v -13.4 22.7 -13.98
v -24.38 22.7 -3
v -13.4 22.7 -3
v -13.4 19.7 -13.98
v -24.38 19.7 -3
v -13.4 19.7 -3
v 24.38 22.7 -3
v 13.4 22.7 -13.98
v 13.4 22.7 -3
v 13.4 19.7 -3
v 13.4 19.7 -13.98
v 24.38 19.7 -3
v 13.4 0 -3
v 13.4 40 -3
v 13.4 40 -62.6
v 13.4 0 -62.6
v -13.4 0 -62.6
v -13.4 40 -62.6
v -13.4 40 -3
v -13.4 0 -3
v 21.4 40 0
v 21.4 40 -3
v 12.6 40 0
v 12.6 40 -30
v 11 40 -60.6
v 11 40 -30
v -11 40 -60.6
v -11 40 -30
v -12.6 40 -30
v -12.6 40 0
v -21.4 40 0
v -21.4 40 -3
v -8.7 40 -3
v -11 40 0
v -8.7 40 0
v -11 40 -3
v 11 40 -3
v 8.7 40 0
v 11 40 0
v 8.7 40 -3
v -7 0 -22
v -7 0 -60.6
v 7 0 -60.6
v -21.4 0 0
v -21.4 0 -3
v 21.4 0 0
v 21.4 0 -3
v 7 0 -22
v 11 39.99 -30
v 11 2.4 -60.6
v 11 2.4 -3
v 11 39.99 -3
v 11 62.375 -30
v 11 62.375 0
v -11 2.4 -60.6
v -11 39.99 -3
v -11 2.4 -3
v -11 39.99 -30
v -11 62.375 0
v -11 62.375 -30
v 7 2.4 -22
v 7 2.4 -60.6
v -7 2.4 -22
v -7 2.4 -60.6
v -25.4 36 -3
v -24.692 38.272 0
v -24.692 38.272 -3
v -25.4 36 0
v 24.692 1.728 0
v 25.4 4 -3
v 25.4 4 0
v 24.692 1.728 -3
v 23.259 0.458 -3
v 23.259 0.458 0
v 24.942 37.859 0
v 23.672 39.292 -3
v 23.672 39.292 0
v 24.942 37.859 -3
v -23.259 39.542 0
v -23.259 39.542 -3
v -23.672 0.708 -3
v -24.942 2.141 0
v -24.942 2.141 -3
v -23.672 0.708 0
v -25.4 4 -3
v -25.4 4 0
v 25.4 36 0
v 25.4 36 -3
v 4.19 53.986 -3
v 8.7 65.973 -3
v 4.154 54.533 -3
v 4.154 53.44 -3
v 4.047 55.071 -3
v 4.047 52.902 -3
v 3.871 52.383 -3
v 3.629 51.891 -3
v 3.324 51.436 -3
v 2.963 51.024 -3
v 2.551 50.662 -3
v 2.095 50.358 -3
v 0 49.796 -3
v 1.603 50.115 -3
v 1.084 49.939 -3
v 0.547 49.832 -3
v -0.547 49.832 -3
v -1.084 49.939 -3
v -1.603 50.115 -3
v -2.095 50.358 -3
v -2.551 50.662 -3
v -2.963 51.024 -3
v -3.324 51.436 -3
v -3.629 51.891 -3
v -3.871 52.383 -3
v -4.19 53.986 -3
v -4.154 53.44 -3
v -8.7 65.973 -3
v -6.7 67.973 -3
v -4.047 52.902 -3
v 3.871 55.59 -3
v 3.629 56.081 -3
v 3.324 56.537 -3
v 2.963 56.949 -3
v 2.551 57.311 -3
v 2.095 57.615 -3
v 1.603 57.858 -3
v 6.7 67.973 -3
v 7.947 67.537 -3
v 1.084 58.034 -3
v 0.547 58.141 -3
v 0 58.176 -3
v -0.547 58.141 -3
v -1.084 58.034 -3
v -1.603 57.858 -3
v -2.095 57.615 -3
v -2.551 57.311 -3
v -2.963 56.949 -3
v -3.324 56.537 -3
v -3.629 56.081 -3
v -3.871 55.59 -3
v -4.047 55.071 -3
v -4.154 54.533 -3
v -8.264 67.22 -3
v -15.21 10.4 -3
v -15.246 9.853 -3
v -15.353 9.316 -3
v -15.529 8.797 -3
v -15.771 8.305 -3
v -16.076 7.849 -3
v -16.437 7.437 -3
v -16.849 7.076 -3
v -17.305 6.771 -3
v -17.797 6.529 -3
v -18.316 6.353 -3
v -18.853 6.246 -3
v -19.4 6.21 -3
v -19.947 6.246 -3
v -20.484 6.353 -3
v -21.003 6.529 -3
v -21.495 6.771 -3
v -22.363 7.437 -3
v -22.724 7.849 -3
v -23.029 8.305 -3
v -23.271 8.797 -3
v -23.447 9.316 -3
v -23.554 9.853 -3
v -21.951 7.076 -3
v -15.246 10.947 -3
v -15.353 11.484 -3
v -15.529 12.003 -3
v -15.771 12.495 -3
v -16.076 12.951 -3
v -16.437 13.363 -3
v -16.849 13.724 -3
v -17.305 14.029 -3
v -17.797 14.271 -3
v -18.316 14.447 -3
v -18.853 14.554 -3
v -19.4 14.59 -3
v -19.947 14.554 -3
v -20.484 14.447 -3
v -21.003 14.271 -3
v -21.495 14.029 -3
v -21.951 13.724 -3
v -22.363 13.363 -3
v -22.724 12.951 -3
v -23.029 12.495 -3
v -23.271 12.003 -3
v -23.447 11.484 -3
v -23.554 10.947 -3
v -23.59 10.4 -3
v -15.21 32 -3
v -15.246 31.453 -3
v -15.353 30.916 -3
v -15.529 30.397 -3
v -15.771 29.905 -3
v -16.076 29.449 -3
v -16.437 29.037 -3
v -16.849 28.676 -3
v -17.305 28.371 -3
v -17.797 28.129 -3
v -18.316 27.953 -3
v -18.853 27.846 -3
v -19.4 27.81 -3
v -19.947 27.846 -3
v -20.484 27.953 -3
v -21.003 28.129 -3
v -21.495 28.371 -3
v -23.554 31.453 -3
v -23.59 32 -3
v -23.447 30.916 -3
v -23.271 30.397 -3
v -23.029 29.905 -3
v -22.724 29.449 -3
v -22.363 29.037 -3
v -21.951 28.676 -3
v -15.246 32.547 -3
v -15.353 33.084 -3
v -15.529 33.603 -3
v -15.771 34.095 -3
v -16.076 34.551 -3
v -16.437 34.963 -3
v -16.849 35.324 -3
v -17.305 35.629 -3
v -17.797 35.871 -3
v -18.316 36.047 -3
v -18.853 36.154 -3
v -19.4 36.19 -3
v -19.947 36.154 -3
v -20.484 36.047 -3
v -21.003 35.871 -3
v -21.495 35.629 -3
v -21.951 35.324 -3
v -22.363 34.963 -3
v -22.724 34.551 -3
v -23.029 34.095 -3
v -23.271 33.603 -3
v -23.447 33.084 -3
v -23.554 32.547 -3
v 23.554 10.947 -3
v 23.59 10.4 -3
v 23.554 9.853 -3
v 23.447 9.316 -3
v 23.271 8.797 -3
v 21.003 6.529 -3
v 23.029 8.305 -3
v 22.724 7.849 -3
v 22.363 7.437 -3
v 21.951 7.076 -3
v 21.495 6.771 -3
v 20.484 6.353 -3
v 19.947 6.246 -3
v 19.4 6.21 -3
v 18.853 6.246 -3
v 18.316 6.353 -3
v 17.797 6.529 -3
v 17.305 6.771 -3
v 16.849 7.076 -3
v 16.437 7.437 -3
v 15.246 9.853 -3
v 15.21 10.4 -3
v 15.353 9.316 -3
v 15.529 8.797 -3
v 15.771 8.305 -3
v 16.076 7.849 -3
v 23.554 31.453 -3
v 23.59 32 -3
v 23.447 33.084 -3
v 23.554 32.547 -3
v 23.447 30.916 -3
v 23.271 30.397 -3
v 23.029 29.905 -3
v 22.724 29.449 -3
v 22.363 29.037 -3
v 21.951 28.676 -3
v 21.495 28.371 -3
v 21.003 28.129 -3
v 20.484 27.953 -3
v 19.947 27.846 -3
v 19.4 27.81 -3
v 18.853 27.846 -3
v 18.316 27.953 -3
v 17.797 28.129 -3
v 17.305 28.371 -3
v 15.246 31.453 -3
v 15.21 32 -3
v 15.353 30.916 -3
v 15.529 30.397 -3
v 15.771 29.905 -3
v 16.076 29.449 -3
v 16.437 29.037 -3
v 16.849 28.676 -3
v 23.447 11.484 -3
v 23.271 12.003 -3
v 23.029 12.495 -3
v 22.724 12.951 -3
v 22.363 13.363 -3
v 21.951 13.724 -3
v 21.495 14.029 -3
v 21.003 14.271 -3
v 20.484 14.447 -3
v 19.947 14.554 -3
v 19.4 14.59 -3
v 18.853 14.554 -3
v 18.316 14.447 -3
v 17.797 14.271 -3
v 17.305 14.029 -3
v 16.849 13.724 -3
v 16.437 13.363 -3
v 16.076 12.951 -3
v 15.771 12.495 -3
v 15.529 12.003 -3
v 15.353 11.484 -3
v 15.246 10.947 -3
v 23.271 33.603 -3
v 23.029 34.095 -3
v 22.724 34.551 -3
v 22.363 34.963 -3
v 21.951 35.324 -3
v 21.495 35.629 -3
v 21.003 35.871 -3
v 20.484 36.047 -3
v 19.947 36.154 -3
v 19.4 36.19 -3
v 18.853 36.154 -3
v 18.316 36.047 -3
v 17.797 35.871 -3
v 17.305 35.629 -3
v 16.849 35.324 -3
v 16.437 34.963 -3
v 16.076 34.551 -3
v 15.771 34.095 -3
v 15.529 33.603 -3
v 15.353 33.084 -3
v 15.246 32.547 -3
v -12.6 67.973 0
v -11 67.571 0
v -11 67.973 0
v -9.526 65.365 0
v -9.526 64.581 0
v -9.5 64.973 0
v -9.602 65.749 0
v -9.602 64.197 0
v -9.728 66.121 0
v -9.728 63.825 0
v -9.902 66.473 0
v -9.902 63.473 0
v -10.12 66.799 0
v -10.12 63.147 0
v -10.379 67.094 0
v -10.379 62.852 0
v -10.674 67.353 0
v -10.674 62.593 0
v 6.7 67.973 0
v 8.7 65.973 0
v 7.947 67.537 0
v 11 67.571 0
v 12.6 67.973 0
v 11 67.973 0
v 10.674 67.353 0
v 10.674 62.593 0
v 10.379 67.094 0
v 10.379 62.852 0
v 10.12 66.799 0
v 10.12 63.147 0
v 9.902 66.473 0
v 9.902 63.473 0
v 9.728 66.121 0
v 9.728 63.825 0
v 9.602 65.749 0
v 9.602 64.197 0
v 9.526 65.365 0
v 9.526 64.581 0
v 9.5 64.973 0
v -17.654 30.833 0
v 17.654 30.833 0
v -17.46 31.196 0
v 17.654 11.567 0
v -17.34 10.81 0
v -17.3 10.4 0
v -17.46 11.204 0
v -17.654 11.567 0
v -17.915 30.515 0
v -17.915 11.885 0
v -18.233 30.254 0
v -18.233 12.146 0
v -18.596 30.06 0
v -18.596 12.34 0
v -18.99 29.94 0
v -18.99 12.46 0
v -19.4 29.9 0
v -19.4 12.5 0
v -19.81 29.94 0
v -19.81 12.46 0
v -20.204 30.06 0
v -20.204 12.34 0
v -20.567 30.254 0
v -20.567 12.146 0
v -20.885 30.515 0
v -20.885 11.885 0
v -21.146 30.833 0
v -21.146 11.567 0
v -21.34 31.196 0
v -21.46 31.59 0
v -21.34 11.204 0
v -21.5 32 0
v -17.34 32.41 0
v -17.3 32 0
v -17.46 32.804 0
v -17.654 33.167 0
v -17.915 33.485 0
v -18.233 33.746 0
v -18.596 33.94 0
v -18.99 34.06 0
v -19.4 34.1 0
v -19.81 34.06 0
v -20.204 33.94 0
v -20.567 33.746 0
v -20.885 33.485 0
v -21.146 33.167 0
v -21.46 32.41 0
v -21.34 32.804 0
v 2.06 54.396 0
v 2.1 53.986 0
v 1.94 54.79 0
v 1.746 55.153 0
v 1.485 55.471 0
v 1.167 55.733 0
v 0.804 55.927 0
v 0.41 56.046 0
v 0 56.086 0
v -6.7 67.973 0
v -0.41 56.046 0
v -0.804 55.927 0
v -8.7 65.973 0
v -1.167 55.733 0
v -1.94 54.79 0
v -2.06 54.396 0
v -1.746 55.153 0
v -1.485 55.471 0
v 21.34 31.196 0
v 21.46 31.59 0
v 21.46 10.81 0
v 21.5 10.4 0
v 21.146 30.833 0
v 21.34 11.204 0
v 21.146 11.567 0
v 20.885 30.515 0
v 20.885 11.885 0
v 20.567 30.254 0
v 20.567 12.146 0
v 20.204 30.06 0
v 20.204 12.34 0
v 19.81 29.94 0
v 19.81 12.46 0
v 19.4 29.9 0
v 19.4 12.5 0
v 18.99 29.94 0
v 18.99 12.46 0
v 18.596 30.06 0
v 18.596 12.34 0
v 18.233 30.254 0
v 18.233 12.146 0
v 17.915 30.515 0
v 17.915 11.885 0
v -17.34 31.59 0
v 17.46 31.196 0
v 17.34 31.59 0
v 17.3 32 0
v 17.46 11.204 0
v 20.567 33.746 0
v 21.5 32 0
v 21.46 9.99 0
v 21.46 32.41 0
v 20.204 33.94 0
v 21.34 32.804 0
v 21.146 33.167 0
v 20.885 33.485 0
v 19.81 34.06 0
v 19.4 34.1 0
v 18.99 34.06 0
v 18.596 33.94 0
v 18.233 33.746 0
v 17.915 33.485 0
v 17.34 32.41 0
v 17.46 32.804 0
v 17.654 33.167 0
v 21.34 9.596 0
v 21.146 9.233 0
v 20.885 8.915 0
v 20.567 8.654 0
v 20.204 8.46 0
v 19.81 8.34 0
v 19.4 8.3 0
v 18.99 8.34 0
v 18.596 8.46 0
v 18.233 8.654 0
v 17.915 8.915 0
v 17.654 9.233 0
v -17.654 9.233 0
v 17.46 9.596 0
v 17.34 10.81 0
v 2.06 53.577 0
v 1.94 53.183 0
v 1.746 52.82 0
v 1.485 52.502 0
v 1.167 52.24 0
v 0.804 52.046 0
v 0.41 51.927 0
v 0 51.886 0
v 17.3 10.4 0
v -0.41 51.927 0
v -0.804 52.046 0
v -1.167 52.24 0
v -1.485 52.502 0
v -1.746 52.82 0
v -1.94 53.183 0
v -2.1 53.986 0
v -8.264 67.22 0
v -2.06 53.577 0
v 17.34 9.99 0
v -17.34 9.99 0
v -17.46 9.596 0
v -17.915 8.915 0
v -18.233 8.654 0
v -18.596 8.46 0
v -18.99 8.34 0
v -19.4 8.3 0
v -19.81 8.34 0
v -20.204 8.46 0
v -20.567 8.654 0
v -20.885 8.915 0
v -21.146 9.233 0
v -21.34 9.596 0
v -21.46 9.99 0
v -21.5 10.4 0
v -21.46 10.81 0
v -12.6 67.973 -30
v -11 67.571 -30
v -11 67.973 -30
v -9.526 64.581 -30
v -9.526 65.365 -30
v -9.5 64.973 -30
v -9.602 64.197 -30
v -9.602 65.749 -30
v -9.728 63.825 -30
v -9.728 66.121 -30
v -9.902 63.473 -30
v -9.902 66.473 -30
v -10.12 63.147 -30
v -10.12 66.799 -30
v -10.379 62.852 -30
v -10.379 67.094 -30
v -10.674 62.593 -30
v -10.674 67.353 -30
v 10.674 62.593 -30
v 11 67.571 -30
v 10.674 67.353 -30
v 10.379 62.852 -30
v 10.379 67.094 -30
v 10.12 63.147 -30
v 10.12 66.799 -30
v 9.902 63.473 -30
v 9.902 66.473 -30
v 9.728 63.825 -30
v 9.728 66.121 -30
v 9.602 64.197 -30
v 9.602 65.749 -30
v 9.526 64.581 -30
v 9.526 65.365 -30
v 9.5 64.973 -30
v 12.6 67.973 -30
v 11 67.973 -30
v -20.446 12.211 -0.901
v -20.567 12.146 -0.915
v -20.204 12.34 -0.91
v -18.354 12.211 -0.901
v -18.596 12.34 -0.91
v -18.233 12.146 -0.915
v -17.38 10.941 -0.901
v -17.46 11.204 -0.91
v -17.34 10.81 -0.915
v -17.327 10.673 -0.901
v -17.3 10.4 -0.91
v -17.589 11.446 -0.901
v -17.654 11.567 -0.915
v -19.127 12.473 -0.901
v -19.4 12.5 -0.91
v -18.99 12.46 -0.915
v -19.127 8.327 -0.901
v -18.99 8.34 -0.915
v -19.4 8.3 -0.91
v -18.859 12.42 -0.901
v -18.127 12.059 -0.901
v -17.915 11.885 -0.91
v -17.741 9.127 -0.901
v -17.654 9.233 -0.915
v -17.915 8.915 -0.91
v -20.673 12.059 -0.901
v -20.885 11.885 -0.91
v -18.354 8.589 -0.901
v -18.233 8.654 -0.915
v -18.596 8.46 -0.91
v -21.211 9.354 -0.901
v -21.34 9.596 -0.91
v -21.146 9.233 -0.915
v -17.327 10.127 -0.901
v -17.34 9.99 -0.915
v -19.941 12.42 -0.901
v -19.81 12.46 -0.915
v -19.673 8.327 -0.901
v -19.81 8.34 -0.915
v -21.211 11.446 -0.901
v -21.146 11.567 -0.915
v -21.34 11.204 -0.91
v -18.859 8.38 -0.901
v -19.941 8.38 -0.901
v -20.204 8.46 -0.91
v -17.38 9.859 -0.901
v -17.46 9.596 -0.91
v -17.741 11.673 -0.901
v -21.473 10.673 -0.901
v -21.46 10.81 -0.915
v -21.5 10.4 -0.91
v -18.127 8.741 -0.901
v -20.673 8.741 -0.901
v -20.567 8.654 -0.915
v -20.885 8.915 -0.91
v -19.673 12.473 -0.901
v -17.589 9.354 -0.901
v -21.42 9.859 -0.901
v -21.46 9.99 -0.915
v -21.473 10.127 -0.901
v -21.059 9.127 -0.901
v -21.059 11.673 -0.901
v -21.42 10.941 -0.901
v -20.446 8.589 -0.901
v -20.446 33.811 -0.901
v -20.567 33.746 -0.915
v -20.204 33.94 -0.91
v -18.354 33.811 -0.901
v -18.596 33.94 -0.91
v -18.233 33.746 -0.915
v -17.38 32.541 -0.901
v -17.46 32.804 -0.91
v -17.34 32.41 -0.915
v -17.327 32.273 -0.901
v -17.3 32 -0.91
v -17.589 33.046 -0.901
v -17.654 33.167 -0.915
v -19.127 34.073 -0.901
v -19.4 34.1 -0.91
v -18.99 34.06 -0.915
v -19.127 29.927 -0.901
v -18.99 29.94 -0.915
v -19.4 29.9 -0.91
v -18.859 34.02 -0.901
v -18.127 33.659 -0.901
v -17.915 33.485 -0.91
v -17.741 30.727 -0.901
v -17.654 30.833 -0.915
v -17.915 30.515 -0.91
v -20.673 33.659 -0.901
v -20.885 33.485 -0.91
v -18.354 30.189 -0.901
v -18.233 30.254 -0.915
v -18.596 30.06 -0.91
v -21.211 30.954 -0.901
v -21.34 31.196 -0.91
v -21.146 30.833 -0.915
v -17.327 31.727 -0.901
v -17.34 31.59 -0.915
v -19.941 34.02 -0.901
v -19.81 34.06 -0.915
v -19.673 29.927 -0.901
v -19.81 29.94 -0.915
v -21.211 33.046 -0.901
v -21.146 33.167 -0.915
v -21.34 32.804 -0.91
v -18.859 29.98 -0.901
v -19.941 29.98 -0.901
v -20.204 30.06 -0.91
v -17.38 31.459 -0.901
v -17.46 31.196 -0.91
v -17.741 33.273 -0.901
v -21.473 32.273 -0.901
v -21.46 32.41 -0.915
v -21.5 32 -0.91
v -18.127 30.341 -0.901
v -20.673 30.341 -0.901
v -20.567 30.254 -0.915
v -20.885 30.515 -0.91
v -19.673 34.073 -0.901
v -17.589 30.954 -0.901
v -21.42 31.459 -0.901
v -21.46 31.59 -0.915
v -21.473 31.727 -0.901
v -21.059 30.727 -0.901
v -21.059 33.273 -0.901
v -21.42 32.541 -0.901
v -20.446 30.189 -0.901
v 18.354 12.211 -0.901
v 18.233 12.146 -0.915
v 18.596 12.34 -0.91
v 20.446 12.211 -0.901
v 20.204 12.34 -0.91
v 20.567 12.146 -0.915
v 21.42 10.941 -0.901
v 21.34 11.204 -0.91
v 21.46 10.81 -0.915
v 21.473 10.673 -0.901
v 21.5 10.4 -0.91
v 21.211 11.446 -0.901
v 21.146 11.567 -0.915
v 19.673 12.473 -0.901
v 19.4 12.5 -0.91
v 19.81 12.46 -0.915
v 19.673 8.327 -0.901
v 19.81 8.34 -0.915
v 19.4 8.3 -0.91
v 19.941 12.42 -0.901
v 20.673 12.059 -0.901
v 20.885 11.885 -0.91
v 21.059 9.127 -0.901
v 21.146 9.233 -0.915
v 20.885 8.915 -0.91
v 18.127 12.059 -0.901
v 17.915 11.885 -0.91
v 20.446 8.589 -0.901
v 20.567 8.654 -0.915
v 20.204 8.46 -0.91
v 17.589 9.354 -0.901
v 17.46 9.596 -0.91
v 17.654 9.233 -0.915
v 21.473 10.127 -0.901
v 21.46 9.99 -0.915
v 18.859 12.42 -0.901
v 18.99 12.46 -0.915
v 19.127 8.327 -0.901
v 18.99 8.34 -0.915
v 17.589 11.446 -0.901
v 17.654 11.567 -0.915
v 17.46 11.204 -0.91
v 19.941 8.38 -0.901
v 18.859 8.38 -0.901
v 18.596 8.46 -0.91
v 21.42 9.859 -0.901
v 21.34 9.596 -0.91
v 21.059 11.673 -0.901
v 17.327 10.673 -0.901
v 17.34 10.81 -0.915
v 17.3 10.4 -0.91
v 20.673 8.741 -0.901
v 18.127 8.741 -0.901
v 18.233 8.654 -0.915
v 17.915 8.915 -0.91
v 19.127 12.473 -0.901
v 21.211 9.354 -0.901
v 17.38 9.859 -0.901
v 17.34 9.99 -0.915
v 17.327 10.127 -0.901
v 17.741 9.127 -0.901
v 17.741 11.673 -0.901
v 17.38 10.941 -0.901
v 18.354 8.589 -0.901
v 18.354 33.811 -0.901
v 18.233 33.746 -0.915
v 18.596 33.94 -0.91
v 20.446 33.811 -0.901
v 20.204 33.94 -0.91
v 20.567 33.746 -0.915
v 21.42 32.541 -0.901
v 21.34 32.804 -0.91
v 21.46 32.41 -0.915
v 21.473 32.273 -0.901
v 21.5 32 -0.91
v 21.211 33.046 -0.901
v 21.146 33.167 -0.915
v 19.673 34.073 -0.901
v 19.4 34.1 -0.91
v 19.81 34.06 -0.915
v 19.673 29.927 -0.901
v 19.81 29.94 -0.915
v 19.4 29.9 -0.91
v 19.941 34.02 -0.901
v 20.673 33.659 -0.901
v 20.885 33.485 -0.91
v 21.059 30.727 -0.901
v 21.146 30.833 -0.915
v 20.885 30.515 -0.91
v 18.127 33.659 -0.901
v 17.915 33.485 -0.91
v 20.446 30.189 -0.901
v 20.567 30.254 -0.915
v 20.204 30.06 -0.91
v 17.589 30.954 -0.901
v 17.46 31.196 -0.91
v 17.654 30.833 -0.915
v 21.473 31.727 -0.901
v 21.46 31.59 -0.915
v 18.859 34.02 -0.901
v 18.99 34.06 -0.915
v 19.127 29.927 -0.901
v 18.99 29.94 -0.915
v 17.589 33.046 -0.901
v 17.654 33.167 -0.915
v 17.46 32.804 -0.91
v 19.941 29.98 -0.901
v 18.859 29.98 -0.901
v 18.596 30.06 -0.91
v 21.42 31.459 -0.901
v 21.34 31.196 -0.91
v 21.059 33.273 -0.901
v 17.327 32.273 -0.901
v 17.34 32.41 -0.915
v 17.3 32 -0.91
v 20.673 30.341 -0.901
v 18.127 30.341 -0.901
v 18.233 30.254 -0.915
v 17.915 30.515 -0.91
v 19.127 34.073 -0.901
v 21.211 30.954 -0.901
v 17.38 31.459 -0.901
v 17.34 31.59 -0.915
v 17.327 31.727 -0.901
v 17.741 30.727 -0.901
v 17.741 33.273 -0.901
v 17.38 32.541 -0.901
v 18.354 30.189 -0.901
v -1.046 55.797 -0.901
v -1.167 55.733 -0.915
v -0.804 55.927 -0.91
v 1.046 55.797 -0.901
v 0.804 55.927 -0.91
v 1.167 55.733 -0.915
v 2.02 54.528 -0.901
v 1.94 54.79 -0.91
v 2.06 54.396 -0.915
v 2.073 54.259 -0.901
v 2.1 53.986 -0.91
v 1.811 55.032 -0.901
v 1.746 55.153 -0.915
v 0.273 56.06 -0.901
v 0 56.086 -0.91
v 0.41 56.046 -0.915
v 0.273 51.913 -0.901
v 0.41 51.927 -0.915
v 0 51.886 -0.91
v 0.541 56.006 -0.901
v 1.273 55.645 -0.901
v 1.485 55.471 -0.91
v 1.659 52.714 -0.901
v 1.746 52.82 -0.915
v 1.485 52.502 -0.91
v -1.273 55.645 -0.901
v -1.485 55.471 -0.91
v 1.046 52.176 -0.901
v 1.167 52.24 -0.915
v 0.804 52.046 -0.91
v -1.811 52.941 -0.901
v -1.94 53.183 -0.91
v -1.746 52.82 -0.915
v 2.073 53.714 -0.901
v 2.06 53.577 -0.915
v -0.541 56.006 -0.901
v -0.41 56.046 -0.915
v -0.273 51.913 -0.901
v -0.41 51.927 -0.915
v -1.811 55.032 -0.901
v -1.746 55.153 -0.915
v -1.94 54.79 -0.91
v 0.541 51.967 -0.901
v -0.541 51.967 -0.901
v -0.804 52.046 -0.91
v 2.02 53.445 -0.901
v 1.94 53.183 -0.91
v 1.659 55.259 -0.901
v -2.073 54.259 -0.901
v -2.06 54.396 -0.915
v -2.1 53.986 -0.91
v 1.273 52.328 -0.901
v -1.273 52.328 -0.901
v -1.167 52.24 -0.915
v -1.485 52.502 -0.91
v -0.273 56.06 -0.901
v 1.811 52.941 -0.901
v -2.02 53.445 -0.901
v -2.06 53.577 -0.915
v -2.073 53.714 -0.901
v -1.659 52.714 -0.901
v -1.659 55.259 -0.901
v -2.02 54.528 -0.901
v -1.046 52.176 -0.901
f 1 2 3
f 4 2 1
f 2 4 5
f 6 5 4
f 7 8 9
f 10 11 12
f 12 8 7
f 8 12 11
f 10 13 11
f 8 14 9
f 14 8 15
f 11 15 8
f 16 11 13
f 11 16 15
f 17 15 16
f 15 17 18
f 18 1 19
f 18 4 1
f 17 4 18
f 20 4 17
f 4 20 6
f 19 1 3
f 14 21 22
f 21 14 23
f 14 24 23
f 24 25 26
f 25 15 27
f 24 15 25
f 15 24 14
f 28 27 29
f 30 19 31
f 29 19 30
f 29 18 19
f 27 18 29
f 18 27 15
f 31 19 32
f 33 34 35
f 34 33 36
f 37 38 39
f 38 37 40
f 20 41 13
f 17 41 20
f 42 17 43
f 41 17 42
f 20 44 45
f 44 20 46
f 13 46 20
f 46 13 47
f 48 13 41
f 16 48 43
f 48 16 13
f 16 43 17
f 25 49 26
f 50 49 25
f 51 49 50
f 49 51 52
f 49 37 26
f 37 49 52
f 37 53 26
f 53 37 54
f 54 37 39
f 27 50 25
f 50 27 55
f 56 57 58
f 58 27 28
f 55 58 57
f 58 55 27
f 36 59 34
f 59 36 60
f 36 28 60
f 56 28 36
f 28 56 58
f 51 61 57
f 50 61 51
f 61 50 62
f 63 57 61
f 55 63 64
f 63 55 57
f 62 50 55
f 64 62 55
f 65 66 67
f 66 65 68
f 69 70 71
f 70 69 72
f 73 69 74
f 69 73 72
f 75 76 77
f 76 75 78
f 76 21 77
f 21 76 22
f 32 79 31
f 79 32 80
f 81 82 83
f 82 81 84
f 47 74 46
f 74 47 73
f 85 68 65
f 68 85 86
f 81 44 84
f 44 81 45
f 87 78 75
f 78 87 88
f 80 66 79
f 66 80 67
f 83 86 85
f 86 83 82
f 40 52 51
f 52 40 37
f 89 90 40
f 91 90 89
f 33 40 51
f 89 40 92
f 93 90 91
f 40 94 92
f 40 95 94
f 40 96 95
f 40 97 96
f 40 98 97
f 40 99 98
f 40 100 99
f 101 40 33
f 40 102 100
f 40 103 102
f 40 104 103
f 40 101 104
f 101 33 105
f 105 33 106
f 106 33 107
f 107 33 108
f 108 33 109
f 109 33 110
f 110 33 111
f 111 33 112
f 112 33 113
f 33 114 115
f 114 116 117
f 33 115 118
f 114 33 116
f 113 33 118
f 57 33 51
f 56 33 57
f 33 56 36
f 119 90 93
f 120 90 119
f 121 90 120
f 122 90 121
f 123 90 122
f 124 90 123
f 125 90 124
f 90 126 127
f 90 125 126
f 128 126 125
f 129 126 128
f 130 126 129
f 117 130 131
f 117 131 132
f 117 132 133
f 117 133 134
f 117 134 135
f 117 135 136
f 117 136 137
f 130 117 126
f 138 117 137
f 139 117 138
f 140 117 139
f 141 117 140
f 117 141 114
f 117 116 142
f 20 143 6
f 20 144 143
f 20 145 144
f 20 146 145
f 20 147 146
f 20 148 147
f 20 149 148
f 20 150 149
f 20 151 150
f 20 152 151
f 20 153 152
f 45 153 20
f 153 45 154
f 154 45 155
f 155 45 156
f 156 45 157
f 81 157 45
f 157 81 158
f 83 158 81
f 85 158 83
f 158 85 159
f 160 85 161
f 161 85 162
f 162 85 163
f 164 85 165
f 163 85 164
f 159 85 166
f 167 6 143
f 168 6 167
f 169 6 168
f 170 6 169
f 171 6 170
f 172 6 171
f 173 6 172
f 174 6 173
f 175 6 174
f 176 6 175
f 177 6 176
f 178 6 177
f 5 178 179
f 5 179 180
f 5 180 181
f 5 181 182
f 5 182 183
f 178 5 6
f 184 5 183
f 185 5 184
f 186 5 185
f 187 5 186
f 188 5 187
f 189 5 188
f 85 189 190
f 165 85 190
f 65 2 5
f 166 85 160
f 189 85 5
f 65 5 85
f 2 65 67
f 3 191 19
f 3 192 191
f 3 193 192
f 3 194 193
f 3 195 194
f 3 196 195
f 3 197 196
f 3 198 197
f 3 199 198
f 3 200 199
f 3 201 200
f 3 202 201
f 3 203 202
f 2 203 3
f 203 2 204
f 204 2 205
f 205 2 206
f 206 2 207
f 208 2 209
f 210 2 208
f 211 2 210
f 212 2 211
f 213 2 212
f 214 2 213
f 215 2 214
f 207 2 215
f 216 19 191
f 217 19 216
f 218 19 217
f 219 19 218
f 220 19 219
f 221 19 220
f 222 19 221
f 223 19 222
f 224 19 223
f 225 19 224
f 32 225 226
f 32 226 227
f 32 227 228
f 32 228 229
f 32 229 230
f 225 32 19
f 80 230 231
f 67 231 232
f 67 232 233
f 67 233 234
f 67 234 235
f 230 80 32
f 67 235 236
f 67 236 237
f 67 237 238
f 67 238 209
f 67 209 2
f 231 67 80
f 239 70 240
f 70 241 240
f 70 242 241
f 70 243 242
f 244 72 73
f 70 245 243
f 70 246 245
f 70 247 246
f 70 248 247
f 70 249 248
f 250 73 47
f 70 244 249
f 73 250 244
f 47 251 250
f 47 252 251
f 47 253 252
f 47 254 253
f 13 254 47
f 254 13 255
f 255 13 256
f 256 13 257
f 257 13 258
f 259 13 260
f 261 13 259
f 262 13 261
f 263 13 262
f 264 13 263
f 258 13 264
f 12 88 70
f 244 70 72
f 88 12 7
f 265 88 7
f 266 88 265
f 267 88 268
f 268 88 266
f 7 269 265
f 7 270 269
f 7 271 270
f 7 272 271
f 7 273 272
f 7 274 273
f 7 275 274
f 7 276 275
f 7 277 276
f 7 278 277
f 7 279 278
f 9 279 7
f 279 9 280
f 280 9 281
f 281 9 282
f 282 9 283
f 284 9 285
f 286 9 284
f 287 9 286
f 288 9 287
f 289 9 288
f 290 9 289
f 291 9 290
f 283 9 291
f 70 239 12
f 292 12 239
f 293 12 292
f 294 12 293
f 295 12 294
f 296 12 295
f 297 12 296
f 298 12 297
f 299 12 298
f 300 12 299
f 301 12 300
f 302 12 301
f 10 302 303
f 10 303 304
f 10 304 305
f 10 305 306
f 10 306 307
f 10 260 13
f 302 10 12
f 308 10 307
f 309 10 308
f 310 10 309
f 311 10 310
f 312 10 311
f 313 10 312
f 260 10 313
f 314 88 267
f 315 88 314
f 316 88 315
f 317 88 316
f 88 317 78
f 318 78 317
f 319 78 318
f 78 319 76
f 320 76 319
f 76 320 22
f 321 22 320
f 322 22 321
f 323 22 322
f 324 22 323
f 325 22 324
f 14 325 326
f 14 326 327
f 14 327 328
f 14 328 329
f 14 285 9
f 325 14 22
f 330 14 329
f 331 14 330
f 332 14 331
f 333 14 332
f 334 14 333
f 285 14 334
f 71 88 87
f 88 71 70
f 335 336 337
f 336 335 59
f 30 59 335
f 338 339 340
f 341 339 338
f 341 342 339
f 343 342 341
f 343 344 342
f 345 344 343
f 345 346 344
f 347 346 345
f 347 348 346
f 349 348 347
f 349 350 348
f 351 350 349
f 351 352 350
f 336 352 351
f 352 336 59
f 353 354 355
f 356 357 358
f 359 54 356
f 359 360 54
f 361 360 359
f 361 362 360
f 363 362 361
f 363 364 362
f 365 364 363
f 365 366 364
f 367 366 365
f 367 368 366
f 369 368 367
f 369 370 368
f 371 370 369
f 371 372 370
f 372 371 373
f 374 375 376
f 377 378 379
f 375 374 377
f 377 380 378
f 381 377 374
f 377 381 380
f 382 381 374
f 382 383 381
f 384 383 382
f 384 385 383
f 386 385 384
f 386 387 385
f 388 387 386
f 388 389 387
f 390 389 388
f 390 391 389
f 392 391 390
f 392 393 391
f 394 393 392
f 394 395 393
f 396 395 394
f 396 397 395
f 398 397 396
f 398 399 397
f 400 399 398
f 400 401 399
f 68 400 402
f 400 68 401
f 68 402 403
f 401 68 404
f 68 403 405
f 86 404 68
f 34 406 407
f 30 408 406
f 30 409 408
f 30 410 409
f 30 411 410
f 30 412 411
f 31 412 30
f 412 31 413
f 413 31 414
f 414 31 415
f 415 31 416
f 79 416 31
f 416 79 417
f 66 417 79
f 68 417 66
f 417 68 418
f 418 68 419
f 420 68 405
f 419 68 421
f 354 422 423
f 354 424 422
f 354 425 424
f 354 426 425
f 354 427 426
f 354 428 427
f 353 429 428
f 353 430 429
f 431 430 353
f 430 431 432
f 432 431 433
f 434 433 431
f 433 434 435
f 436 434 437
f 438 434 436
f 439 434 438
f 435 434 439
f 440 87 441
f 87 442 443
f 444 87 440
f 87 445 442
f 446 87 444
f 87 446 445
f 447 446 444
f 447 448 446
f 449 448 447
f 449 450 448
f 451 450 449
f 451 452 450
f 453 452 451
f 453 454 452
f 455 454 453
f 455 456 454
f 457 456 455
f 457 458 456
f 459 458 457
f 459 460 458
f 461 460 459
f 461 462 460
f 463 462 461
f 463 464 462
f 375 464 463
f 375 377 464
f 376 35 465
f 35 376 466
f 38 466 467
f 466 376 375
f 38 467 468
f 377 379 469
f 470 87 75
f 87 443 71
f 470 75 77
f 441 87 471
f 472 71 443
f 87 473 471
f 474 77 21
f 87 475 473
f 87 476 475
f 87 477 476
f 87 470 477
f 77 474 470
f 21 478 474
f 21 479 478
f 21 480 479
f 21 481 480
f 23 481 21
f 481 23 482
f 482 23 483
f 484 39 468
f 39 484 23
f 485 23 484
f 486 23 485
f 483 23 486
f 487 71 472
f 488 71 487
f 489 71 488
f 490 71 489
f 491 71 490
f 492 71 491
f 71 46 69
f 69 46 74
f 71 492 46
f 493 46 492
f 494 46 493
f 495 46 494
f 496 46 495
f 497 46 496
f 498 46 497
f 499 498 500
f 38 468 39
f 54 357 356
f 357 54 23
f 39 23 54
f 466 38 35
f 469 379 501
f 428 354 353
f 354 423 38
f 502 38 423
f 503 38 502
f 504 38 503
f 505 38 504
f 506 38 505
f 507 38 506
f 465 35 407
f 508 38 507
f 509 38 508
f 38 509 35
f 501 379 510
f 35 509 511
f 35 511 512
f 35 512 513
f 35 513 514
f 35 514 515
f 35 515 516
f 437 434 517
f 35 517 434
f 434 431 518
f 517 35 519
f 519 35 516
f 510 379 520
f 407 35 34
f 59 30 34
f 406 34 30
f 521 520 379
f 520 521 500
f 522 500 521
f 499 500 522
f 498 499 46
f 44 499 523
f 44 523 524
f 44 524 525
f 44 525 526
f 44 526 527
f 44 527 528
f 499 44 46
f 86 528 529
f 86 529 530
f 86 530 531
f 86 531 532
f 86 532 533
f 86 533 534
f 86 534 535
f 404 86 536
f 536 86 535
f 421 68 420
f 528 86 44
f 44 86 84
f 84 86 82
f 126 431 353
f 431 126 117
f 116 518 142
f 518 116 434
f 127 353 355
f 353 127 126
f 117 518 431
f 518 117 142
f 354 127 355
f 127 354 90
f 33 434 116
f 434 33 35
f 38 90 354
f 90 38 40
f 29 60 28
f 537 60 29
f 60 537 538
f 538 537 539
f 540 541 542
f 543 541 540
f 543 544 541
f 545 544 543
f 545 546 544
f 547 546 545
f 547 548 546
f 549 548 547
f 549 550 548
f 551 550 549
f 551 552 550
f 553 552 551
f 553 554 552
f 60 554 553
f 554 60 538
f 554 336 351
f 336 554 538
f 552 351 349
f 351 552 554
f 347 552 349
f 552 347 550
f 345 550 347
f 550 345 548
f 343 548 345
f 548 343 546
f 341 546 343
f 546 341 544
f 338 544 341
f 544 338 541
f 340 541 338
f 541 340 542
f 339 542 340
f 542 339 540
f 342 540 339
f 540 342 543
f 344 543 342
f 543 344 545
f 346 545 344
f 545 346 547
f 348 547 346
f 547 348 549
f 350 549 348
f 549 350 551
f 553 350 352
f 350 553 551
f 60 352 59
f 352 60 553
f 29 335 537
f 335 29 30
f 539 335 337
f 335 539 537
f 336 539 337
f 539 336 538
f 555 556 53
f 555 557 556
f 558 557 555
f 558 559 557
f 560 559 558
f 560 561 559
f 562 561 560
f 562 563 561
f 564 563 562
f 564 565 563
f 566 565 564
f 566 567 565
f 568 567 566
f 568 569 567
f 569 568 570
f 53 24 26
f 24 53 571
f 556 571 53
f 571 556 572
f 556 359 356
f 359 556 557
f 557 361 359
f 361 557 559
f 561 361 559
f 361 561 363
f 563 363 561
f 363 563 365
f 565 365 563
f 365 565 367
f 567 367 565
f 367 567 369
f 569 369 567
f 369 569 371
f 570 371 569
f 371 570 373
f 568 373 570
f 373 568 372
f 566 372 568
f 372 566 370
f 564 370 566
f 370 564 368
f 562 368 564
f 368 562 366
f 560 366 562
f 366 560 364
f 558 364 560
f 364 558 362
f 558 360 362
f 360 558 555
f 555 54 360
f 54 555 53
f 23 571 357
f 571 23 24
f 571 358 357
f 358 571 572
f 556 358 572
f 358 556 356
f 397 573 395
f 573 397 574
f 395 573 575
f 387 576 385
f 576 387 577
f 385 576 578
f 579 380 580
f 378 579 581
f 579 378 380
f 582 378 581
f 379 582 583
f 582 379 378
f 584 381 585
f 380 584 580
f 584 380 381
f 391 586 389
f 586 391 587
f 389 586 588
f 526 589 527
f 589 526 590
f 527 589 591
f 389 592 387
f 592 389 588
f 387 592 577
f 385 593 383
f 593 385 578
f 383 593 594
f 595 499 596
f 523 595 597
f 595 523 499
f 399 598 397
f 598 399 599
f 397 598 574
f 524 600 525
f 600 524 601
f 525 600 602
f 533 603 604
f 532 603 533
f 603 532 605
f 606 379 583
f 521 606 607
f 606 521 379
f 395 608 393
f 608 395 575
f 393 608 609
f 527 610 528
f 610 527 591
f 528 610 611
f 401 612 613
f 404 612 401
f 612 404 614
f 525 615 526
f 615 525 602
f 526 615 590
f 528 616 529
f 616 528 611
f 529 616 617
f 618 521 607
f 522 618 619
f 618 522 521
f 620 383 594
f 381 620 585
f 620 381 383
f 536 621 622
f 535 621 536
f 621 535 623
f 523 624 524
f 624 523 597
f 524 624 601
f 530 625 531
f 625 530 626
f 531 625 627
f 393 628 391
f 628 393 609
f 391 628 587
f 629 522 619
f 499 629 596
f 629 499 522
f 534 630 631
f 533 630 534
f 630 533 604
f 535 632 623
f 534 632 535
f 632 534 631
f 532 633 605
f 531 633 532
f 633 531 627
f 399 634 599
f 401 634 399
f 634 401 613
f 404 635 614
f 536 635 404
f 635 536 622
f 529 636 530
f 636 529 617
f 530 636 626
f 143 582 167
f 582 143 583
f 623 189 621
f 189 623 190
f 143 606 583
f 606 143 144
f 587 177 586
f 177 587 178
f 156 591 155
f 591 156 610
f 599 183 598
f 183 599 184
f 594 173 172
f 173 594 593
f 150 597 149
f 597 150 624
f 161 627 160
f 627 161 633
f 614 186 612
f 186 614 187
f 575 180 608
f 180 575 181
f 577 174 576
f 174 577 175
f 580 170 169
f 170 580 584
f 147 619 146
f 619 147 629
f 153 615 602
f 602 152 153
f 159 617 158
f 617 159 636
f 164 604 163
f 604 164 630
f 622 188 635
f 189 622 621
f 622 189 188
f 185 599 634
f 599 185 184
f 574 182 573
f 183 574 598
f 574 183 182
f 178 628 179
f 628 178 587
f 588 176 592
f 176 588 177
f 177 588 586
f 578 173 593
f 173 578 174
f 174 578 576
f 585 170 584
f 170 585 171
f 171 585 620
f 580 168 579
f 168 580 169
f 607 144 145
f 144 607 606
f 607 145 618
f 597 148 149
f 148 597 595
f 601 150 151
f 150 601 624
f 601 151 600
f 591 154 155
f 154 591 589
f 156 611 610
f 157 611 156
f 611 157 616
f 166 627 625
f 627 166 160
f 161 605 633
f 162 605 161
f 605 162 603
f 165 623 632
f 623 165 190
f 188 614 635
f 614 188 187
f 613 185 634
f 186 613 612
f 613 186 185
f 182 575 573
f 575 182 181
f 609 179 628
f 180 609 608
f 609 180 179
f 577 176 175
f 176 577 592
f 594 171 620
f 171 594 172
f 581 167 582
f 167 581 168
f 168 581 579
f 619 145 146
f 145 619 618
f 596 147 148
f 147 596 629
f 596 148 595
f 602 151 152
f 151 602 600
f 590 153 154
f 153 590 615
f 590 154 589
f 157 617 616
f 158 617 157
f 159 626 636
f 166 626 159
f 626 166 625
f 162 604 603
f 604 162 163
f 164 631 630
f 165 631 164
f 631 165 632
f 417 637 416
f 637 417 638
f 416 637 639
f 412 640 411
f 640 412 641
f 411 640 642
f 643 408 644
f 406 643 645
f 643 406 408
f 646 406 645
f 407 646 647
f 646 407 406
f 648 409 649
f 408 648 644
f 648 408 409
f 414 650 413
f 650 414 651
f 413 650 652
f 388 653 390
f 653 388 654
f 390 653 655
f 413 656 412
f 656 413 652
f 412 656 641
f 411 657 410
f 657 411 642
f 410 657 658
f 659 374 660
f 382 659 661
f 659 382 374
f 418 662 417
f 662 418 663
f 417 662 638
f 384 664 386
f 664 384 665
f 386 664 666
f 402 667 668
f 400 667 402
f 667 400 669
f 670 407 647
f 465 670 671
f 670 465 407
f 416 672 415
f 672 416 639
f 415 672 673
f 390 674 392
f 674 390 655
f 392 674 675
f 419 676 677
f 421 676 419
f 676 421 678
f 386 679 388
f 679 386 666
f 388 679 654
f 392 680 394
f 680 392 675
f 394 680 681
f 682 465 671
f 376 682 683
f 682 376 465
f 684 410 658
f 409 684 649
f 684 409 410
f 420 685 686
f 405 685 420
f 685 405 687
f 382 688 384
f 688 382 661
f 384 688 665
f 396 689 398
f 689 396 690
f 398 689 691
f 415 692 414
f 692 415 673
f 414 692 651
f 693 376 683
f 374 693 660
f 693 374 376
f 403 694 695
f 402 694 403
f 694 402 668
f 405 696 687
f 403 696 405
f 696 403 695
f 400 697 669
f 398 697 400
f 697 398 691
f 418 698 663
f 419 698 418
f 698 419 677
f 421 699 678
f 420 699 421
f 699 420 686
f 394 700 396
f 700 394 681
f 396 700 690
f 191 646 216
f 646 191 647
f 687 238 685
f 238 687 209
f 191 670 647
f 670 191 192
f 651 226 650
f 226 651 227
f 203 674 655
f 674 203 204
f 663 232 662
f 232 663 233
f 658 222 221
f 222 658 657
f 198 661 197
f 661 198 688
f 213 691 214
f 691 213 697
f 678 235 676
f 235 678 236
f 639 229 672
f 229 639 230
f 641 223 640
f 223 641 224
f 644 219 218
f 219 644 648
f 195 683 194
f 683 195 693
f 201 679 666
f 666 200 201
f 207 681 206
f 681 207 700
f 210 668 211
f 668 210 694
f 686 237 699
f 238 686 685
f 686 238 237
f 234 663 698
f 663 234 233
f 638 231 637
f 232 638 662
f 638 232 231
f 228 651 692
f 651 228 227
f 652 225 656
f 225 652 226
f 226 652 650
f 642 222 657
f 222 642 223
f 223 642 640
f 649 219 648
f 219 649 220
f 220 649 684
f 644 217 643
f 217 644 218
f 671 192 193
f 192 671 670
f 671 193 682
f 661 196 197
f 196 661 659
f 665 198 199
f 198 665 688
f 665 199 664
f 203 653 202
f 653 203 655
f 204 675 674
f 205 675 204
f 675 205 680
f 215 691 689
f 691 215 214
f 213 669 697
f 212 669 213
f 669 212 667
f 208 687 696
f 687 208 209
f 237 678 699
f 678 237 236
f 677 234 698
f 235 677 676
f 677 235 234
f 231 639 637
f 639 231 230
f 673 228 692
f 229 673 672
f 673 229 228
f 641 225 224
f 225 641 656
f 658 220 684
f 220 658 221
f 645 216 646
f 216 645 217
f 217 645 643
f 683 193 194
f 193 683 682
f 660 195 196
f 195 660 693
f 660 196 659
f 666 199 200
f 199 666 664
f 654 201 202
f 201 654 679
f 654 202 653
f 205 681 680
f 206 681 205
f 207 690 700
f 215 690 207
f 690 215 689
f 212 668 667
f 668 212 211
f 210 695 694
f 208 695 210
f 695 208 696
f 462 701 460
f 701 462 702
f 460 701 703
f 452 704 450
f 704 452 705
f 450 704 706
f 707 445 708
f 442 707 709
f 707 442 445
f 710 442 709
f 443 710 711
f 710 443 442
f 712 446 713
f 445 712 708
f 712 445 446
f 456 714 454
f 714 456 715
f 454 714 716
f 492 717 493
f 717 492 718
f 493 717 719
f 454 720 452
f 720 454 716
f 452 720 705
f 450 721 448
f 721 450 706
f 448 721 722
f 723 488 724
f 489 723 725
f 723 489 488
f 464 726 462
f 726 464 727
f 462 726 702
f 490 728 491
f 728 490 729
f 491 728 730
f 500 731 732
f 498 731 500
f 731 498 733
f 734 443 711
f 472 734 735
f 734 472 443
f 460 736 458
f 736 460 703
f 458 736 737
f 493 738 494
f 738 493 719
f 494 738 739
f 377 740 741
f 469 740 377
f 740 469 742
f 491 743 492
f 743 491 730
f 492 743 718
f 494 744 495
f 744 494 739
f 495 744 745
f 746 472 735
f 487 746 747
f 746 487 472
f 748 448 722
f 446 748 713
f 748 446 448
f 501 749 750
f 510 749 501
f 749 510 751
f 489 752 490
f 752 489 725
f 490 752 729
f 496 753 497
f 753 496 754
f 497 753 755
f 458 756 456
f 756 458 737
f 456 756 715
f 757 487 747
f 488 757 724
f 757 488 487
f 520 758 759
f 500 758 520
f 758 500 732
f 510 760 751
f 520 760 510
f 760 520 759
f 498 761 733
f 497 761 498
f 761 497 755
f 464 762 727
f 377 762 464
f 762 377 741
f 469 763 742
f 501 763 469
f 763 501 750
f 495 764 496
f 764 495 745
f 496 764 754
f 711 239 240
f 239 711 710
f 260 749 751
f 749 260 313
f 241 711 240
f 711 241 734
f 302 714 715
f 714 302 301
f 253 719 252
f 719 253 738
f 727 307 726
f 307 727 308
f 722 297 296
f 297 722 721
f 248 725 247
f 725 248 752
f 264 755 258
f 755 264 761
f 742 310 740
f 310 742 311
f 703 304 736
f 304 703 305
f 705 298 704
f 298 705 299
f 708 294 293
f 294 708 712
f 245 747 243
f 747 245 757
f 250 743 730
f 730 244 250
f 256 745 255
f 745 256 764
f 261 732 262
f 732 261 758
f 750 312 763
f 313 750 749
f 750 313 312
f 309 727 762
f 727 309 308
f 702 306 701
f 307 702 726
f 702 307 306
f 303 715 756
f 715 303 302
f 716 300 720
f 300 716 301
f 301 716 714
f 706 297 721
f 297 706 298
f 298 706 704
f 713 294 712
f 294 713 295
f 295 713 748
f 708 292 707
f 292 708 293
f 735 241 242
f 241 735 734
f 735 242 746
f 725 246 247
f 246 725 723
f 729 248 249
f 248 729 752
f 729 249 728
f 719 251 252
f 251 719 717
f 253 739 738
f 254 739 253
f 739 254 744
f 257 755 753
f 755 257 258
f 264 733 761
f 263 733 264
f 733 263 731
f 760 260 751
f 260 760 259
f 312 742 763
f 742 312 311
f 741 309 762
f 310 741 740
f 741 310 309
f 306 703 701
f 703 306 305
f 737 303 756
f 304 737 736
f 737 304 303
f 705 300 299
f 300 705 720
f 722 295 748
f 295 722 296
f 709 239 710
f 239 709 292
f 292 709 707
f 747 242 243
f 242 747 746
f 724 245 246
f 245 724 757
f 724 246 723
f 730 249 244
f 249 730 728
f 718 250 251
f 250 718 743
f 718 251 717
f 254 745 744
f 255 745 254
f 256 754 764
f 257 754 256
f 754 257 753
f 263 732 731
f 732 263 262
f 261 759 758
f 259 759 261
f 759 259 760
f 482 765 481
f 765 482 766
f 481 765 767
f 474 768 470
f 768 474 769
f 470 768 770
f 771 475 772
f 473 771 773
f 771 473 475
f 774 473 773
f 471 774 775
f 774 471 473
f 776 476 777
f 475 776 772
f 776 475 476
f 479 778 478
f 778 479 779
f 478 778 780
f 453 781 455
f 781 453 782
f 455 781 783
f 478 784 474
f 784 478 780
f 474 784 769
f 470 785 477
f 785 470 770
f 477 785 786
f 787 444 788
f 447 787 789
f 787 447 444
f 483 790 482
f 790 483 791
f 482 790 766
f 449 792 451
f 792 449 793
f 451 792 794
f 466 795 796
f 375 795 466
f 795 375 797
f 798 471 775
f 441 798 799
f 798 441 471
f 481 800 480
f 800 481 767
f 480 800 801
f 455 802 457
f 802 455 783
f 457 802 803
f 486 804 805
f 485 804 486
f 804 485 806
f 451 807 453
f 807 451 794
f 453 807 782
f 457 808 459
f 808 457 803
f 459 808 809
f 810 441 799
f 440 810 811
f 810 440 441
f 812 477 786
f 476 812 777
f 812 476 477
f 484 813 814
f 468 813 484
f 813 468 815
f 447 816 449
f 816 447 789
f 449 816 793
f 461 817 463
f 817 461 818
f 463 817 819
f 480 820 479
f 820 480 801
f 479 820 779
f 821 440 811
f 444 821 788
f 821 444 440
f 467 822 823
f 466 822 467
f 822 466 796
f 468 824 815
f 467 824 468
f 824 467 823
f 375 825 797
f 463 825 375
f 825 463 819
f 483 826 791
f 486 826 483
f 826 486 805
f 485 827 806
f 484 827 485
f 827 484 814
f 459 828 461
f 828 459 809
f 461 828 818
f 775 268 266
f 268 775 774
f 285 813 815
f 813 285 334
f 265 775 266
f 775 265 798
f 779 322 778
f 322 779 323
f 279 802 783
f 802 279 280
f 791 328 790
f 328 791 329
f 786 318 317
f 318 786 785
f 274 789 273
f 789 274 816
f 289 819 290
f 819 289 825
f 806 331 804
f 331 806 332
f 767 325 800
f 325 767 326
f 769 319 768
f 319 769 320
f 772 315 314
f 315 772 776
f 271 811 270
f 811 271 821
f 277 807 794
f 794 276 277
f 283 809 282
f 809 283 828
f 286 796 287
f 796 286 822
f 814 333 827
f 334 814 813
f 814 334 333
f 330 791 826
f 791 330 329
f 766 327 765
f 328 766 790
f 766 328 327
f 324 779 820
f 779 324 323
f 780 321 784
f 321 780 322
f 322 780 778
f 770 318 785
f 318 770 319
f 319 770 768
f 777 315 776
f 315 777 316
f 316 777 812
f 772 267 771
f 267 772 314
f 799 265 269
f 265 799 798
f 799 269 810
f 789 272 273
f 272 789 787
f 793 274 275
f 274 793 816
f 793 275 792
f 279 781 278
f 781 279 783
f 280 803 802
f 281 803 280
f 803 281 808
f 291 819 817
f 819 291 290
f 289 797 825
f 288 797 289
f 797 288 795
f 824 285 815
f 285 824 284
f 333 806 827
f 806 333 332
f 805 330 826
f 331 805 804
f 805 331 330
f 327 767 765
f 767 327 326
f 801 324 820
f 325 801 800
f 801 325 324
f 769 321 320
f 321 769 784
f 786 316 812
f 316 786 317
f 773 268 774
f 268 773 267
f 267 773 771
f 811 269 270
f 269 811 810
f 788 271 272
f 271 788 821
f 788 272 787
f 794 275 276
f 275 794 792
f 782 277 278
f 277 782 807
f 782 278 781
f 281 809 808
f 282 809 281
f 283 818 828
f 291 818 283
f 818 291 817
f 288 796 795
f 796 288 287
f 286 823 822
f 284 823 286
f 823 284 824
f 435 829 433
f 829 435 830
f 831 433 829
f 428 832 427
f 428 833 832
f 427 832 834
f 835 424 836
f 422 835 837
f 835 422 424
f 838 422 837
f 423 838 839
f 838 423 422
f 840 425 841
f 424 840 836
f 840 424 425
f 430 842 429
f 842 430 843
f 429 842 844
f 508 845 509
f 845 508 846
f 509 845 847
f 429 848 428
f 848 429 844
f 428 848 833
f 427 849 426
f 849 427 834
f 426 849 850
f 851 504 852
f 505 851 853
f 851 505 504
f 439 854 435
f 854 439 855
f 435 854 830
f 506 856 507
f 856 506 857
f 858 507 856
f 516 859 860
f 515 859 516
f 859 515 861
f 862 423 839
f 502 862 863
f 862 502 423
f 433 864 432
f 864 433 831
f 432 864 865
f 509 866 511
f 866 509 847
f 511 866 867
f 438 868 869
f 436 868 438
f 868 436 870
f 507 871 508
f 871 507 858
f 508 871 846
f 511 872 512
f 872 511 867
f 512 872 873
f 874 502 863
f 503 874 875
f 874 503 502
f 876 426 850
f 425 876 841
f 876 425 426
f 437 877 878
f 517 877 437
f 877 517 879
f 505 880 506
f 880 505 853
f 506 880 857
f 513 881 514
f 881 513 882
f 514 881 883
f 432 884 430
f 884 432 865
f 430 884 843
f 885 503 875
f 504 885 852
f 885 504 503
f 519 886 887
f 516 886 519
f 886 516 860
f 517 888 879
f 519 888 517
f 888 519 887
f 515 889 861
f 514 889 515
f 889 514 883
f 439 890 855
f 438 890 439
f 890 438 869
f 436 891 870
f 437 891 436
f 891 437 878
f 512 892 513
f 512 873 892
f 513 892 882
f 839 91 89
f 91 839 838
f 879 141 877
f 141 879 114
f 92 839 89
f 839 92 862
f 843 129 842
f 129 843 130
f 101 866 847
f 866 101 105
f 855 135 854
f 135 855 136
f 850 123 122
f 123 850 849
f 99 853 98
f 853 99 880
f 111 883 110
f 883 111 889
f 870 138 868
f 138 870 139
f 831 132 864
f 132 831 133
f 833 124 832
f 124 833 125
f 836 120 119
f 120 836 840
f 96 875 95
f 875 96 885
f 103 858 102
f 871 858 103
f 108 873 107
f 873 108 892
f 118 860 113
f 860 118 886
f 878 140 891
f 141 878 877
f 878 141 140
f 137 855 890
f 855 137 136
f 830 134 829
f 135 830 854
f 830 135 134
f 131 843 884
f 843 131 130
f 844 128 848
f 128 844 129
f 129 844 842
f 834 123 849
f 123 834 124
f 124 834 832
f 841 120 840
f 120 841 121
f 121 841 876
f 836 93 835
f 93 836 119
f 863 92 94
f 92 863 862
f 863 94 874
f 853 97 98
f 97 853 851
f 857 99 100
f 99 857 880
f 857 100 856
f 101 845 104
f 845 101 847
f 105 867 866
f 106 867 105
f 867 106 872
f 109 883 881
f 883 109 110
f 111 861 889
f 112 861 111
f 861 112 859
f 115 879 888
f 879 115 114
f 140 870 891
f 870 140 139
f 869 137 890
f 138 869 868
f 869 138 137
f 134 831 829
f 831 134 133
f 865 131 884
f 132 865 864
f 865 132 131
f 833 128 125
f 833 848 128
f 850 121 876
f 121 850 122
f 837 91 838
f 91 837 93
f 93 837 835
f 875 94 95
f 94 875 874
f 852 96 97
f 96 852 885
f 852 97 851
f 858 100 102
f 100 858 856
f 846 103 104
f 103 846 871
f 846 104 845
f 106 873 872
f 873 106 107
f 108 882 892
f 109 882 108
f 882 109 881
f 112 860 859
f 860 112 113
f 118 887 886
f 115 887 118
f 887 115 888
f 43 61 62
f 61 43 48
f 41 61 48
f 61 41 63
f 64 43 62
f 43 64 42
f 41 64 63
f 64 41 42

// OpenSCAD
// file: ../../lib/makeit.scad
// Shared helpers for makeit models. Use with: use <../../lib/makeit.scad>
// Conventions: millimetres; x/y/z of the *installed* part, z up.

// Keep only the part of children() with y in [y0, y1].
module keep_y(y0, y1, big = 2000) {
    intersection() {
        children();
        translate([-big / 2, y0, -big / 2]) cube([big, y1 - y0, big]);
    }
}

// Piece `index` (0-based) of `count` equal cuts along y, for parts longer
// than the print bed. index < 0 keeps the whole part.
module segment_y(length, count, index) {
    if (count <= 1 || index < 0) children();
    else keep_y(length / count * index, length / count * (index + 1)) children();
}

// Short test-fit slice from the y=0 end (0 = off), else the chosen segment.
// The build sets $section_at (0..1 along y) to render a thin cross-section
// for the profile view.
module print_cut(length, test_slice = 0, segments = 1, segment = -1) {
    if (!is_undef($section_at)) keep_y(length * $section_at, length * $section_at + 0.5) children();
    else if (test_slice > 0) keep_y(0, test_slice) children();
    else segment_y(length, segments, segment) children();
}

// ---- Shapes that keep coming back (2D unless noted) ----

// Rounded rectangle from corner (x0, y0) to (x1, y1).
module rrect(x0, y0, x1, y1, r) {
    r_ = min(r, (x1 - x0) / 2 - 0.01, (y1 - y0) / 2 - 0.01);
    translate([x0 + r_, y0 + r_]) offset(r_) square([x1 - x0 - 2 * r_, y1 - y0 - 2 * r_]);
}

// 3D: countersunk screw hole through a plate of thickness t lying on z=0..t,
// head at z=t. Subtract it. Defaults suit a 4 mm (#8) wood screw. Printed
// head-up, the cone opens upward, so it needs no support.
module cs_screw_hole(t, d = 4.2, head_d = 8.4, fn = 32) {
    translate([0, 0, -0.01]) cylinder(d = d, h = t + 0.02, $fn = fn);
    translate([0, 0, t - head_d / 2 + 0.01]) cylinder(d1 = 0, d2 = head_d, h = head_d / 2, $fn = fn * 1.5);
}

// 3D: 45° brace in the corner between a floor (z=0 up) and a wall face at
// x=0 (body at x<0), sticking out along +x, `leg` long, `t` thick along y
// (centred). It prints without support with the floor on the bed.
module gusset45(leg, t) {
    translate([-0.01, t / 2, -0.01]) rotate([90, 0, 0]) linear_extrude(t)
        polygon([[0, 0], [leg, 0], [0, leg]]);
}

// y position for a detent bump of radius rb standing `depth` into a channel
// so it touches a rounded corner (radius rc) of the part it holds.
// wall_x = the channel's inner wall (x), part_x = the part's side face (x),
// corner_y = y where the part's corner rounding starts (its end minus rc).
// Subtract a little preload so the bump pulls the part home.
function detent_y(wall_x, part_x, rc, rb, depth, corner_y) =
    let(xb = wall_x - depth + rb, ax = part_x - rc)
    corner_y + sqrt(pow(rc + rb, 2) - pow(xb - ax, 2));
// main file
// Under-desk holder for the Lenovo earbud case (the one with the braided
// USB-C lanyard). The case stands on edge in a tall, narrow sleeve hanging
// from the desk: a top plate with screw ears, two side walls, a back wall
// (solid for the top 19 mm, open below for the cable) and a floor the case
// stands on. The front is open. The upper part of each side wall carries
// on past the floor as a spring finger with a bump. The bumps click in
// behind the case's rounded front edge, so the case can't creep out, and a
// firm pull pops it free.
//
// Installed frame: x = across the sleeve (centred), y = into the holder
// (y=0 at the back face, the case slides in toward -y), z = up with z=0 at
// the underside of the desk (the part hangs below, z < 0).
//
// Prints upside down: the desk plate goes on the bed. Walls, fingers and
// bumps are straight vertical extrusions, 45° gussets brace the ears, the
// back opening's top is the floor, and the floor is a short wall-to-wall
// bridge. No supports.
use <../../lib/makeit.scad>

/* [Measured] */
case_w = 21.0;       // hand: sketch note "210", case thickness, across the sleeve (x)
case_h = 57.0;       // hand: photo note "570", standing height (z). Lanyard side faces the back.
case_l = 64.0;       // hand: photo note "640", slide direction (y)
case_edge_r = 5;     // PLACEHOLDER: radius of the rounded edges round the case's faces (from the photo)
back_band_h = 19;    // sketch: back wall solid for the top 19 mm, open below

/* [Design] */
clearance = 0.5;     // per side, x and y: the case should drop in, not press in
clearance_z = 0.6;   // total, over the height
plate_t = 3.0;       // desk plate (on the bed when printing)
wall = 2.4;          // side and back walls (6 perimeters at 0.4)
floor_t = 2.0;       // bridged floor
ear = 12;            // screw ear width beyond each side wall
ear_r = 4;           // ear corner radius
gusset_t = 3;        // 45° brace from each ear down its wall (0 = none)
floor_depth = 40;    // floor and walls run 0..floor_depth; fingers carry on past it
back_open_w = 14;    // opening below the band: cable out, or a finger to push the case out
finger_h = 30;       // spring finger height from the desk (includes the plate)
finger_t = 1.6;      // spring finger thickness (x)
detent_depth = 1.5;  // how far each bump stands into the cavity
detent_r = 3;        // bump radius (plan view)
detent_preload = 0.3;// bump sits this far behind the edge: pulls the case to the back
finger_gap = 0.8;    // slot between the fingers and the plate around them
screw_d = 4.2;       // clearance for a 4 mm (#8) wood screw
screw_head_d = 8.4;  // 90° countersink
front_screw = true;  // extra countersunk screw in the ceiling between the fingers

/* [Print] */
test_slice = 0;      // >0: only the back N mm (checks width/height fit)
segments = 1;
segment = -1;
orient = "installed";

// Derived
wi = case_w + 2 * clearance;          // inner width
hi = case_h + clearance_z;            // inner height
y0 = wall;                            // inner back face
h_total = plate_t + hi + floor_t;
xo = wi / 2 + wall;                   // outer face of the side walls
xe = xo + ear;                        // ear tips
// Bump centre: a circle of radius detent_r standing detent_depth into the
// cavity, touching the case's rounded front edge when the case is fully in.
xb = wi / 2 - detent_depth + detent_r;
arc_x = case_w / 2 - case_edge_r;
arc_y = y0 + case_l - case_edge_r;
yb = detent_y(wi / 2, case_w / 2, case_edge_r, detent_r, detent_depth, arc_y) - detent_preload;
y_end = yb + detent_r;                // fingers end here
length = y_end;
plate_front_x = wi / 2 - detent_depth - finger_gap;
hole_ys = [y0 + 8, floor_depth - 8];
finger_len = yb - floor_depth;

echo(str("holder ", 2 * xe, " x ", length, " x ", h_total, " mm; finger ", finger_len,
         " mm; case sticks out ", y0 + case_l - y_end, " mm past the fingers"));

assert(pow(case_edge_r + detent_r, 2) > pow(xb - arc_x, 2), "bump misses the edge arc");
assert(finger_len >= 15, "fingers too short to flex: lower floor_depth");
assert(floor_depth > y0 + case_l / 2 + 3, "floor must reach past the case's middle");
assert(back_band_h < hi, "back band taller than the cavity");
assert(back_open_w <= wi, "back opening wider than the cavity");
assert(finger_h >= plate_t + 10 && finger_h <= plate_t + hi, "finger_h out of range");
assert(detent_depth > clearance + 0.5, "bumps would not touch the case");
assert(xb - detent_r < wi / 2 + finger_t, "bump detached from its finger");
assert(2 * plate_front_x > screw_head_d + 2 || !front_screw, "no room for the front screw");

// Countersunk screw hole through the plate; the head sits on the underside.
module screw_hole(x, y) {
    translate([x, y, 0]) mirror([0, 0, 1]) cs_screw_hole(plate_t, screw_d, screw_head_d);
}

module body() {
    // Plate with ears, over the walled section only (fingers need free space).
    translate([0, 0, -plate_t]) linear_extrude(plate_t)
        rrect(-xe, 0, xe, floor_depth, ear_r);
    // Ceiling between the fingers, clear of the bumps.
    translate([0, 0, -plate_t]) linear_extrude(plate_t)
        rrect(-plate_front_x, floor_depth - 2, plate_front_x, y_end, 2);
    // 45° gussets under the ears, between the two screw holes.
    if (gusset_t > 0) for (s = [-1, 1]) mirror([s < 0 ? 1 : 0, 0, 0])
        translate([xo, (hole_ys[0] + hole_ys[1]) / 2, -plate_t]) mirror([0, 0, 1]) gusset45(ear - 1, gusset_t);
    // Side walls + floor + back wall as one U, full height.
    translate([0, 0, -h_total]) difference() {
        translate([-xo, 0, 0]) cube([2 * xo, floor_depth, h_total]);
        translate([-wi / 2, y0, floor_t]) cube([wi, floor_depth, hi + 1]);
    }
}

module fingers() {
    for (s = [-1, 1]) mirror([s < 0 ? 1 : 0, 0, 0])
        translate([0, 0, -finger_h]) linear_extrude(finger_h) {
            translate([wi / 2, floor_depth - 0.01]) square([finger_t, y_end - floor_depth + 0.01]);
            intersection() {
                translate([xb, yb]) circle(r = detent_r, $fn = 48);
                translate([0, floor_depth]) square([wi / 2 + finger_t, y_end]);
            }
        }
}

module part() {
    difference() {
        union() { body(); fingers(); }
        // Back wall: solid band under the plate, open below it down to the floor.
        translate([-back_open_w / 2, -1, -plate_t - hi]) cube([back_open_w, y0 + 2, hi - back_band_h]);
        for (s = [-1, 1], y = hole_ys) screw_hole(s * (xo + ear / 2), y);
        if (front_screw) screw_hole(0, (floor_depth + y_end) / 2);
    }
}

// Desk underside and the earbud case (fully inserted), previews only.
module context() {
    translate([-xe - 20, -20, 0]) cube([2 * xe + 40, length + 40, 18]);
    color("dimgray") translate([0, 0, -plate_t - case_h - clearance_z / 2])
        linear_extrude(case_h) rrect(-case_w / 2, y0, case_w / 2, y0 + case_l, case_edge_r);
}

if (orient == "print") {
    // Upside down: desk face on the bed.
    rotate([180, 0, 0]) print_cut(length, test_slice, segments, segment) part();
} else {
    %print_cut(length, test_slice, segments, segment) context();
    print_cut(length, test_slice, segments, segment) part();
}
